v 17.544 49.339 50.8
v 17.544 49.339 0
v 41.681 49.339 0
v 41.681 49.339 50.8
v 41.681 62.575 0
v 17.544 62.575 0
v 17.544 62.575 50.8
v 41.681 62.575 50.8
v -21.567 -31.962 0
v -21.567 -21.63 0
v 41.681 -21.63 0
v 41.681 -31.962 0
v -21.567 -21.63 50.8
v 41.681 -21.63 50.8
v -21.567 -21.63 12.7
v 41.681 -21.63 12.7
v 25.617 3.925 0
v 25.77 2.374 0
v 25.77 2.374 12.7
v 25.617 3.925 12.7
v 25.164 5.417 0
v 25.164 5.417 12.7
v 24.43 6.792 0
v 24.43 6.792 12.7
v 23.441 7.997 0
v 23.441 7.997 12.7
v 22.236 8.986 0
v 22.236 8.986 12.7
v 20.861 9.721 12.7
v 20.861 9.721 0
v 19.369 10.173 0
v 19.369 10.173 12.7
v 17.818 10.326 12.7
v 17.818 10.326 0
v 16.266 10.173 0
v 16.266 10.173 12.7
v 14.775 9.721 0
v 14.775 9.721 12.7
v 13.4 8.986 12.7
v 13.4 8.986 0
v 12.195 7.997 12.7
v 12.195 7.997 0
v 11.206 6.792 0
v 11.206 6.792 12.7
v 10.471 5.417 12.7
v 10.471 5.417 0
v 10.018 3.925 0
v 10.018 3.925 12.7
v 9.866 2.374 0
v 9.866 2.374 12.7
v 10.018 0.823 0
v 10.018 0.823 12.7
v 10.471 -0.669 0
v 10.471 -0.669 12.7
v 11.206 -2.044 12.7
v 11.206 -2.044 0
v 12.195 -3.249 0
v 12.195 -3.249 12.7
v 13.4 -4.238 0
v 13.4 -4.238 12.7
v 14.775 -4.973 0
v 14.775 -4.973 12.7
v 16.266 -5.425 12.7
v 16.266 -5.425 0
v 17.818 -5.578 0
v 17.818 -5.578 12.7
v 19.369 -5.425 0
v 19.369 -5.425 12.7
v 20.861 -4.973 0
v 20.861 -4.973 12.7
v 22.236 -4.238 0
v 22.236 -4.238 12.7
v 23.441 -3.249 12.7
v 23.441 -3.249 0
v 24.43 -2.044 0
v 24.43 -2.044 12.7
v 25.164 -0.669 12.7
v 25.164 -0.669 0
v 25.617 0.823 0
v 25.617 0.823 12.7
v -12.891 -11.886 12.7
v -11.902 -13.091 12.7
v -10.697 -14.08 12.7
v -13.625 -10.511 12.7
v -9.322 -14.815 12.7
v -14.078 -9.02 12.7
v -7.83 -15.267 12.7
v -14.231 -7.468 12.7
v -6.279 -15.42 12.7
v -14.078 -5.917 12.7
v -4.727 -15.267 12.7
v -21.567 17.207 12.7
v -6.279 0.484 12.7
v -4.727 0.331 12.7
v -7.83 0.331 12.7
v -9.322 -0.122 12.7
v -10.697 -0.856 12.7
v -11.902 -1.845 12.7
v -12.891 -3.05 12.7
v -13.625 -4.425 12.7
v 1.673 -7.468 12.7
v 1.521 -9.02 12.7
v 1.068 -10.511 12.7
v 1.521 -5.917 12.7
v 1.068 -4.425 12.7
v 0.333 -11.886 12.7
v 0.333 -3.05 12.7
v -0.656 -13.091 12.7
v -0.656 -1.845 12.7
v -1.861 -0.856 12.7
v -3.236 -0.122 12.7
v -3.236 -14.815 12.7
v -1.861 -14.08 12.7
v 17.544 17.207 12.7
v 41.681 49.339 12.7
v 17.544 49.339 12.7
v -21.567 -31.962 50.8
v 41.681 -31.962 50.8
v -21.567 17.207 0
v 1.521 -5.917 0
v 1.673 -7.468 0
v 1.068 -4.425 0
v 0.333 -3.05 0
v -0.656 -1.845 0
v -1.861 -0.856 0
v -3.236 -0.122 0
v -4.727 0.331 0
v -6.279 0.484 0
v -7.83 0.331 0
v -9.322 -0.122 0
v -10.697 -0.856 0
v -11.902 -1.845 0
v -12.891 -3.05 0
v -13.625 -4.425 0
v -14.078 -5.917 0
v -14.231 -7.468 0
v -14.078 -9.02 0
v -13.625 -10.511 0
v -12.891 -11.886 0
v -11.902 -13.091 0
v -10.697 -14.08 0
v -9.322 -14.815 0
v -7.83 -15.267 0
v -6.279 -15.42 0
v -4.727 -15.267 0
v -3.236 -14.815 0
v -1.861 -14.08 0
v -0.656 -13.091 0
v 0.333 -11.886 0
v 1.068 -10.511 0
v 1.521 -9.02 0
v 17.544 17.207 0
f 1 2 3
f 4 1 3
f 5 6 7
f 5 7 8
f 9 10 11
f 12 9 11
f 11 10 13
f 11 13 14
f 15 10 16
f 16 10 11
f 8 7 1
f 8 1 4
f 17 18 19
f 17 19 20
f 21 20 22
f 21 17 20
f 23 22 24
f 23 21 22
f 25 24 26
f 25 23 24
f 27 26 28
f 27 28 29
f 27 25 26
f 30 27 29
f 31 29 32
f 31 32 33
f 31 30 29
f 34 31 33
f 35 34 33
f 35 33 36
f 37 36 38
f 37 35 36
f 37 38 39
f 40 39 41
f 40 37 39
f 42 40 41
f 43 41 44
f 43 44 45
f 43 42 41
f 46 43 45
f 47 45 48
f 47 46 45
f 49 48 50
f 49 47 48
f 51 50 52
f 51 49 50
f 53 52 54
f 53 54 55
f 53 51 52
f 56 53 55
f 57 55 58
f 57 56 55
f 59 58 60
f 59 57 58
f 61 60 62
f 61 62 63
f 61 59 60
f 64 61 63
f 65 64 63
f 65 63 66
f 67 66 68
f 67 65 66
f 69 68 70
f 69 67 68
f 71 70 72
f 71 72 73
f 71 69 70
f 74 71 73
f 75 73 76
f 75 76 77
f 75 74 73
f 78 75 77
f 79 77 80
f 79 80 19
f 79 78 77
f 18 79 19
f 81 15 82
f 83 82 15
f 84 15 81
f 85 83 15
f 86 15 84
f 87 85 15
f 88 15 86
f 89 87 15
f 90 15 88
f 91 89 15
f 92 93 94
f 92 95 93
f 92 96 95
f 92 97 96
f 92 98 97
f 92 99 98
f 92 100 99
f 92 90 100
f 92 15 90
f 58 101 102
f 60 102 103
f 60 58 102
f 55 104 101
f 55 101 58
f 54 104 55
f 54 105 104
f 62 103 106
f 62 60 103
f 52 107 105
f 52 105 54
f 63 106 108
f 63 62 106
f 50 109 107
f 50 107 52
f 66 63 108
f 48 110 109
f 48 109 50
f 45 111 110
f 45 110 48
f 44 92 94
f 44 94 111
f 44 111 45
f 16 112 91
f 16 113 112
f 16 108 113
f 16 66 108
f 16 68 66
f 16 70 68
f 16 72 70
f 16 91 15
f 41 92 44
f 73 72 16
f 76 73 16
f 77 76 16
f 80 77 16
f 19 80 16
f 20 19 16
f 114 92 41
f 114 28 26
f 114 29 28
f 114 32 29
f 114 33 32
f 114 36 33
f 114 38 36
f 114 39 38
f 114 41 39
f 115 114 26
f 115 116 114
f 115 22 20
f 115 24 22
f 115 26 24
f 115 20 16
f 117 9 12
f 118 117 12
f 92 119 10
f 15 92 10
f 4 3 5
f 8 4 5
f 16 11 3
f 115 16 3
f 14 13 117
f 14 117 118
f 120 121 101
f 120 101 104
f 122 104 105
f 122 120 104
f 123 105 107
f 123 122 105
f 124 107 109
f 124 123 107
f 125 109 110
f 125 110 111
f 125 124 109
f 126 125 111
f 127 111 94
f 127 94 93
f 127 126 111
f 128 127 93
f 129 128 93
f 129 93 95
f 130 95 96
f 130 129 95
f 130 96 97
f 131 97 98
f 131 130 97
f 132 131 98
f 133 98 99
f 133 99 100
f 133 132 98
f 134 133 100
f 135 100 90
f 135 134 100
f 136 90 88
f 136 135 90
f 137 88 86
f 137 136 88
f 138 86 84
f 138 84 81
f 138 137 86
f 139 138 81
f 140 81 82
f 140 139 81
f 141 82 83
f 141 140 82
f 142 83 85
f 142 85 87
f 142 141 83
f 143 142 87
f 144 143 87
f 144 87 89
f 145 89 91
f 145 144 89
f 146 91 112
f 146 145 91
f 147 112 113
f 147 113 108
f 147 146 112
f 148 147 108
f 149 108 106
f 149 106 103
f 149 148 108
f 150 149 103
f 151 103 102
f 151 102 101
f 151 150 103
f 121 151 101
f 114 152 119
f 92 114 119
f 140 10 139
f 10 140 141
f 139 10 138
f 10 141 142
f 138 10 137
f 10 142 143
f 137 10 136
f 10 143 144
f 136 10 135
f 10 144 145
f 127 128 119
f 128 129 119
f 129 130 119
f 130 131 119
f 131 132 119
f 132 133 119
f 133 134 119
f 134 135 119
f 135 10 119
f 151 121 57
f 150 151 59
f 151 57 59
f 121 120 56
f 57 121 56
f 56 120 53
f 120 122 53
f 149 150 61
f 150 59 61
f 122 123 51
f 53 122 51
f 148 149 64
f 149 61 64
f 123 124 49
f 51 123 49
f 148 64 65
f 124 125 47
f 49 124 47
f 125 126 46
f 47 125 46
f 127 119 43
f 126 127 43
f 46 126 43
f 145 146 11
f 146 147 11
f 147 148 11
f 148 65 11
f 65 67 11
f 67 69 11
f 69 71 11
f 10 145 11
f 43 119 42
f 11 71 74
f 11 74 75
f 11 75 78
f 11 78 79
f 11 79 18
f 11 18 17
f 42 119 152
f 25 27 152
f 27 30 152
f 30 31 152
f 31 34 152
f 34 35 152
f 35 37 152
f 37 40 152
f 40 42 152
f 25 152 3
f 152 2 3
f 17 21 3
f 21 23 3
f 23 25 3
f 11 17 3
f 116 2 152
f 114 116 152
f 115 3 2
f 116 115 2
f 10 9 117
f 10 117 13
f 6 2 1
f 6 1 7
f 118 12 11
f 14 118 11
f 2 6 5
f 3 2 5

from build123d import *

# Parameters (mm, degrees)
F0_W     = 24.137096
F0_H     = 13.236284
F0_W_2   = 63.248131
F0_H_2   = 10.331848
F1_DEPTH = 50.8
F0_R     = 7.952044
F2_DEPTH = 12.7


with BuildPart() as f1:
    # F0 (on Top) → F1 (new body)
    with BuildSketch(Plane.XY):
        with Locations((29.612641, 55.957183)):
            Rectangle(F0_W, F0_H)
        with Locations((10.057123, -26.795703)):
            Rectangle(F0_W_2, F0_H_2)
    extrude(amount=F1_DEPTH)


with BuildPart() as f2:
    # F0 (on Top) → F2 (new body)
    with BuildSketch(Plane.XY):
        Polygon((17.544093, 17.206527), (-21.566942, 17.206527), (-21.566942, -21.629779), (41.681189, -21.629779), (41.681189, 49.339041), (17.544093, 49.339041), align=None)
        with Locations((-6.278621, -7.468236)):
            Circle(F0_R, mode=Mode.SUBTRACT)
        with Locations((17.81771, 2.373928)):
            Circle(F0_R, mode=Mode.SUBTRACT)
    extrude(amount=F2_DEPTH)


solid = Compound([f1.part, f2.part])
